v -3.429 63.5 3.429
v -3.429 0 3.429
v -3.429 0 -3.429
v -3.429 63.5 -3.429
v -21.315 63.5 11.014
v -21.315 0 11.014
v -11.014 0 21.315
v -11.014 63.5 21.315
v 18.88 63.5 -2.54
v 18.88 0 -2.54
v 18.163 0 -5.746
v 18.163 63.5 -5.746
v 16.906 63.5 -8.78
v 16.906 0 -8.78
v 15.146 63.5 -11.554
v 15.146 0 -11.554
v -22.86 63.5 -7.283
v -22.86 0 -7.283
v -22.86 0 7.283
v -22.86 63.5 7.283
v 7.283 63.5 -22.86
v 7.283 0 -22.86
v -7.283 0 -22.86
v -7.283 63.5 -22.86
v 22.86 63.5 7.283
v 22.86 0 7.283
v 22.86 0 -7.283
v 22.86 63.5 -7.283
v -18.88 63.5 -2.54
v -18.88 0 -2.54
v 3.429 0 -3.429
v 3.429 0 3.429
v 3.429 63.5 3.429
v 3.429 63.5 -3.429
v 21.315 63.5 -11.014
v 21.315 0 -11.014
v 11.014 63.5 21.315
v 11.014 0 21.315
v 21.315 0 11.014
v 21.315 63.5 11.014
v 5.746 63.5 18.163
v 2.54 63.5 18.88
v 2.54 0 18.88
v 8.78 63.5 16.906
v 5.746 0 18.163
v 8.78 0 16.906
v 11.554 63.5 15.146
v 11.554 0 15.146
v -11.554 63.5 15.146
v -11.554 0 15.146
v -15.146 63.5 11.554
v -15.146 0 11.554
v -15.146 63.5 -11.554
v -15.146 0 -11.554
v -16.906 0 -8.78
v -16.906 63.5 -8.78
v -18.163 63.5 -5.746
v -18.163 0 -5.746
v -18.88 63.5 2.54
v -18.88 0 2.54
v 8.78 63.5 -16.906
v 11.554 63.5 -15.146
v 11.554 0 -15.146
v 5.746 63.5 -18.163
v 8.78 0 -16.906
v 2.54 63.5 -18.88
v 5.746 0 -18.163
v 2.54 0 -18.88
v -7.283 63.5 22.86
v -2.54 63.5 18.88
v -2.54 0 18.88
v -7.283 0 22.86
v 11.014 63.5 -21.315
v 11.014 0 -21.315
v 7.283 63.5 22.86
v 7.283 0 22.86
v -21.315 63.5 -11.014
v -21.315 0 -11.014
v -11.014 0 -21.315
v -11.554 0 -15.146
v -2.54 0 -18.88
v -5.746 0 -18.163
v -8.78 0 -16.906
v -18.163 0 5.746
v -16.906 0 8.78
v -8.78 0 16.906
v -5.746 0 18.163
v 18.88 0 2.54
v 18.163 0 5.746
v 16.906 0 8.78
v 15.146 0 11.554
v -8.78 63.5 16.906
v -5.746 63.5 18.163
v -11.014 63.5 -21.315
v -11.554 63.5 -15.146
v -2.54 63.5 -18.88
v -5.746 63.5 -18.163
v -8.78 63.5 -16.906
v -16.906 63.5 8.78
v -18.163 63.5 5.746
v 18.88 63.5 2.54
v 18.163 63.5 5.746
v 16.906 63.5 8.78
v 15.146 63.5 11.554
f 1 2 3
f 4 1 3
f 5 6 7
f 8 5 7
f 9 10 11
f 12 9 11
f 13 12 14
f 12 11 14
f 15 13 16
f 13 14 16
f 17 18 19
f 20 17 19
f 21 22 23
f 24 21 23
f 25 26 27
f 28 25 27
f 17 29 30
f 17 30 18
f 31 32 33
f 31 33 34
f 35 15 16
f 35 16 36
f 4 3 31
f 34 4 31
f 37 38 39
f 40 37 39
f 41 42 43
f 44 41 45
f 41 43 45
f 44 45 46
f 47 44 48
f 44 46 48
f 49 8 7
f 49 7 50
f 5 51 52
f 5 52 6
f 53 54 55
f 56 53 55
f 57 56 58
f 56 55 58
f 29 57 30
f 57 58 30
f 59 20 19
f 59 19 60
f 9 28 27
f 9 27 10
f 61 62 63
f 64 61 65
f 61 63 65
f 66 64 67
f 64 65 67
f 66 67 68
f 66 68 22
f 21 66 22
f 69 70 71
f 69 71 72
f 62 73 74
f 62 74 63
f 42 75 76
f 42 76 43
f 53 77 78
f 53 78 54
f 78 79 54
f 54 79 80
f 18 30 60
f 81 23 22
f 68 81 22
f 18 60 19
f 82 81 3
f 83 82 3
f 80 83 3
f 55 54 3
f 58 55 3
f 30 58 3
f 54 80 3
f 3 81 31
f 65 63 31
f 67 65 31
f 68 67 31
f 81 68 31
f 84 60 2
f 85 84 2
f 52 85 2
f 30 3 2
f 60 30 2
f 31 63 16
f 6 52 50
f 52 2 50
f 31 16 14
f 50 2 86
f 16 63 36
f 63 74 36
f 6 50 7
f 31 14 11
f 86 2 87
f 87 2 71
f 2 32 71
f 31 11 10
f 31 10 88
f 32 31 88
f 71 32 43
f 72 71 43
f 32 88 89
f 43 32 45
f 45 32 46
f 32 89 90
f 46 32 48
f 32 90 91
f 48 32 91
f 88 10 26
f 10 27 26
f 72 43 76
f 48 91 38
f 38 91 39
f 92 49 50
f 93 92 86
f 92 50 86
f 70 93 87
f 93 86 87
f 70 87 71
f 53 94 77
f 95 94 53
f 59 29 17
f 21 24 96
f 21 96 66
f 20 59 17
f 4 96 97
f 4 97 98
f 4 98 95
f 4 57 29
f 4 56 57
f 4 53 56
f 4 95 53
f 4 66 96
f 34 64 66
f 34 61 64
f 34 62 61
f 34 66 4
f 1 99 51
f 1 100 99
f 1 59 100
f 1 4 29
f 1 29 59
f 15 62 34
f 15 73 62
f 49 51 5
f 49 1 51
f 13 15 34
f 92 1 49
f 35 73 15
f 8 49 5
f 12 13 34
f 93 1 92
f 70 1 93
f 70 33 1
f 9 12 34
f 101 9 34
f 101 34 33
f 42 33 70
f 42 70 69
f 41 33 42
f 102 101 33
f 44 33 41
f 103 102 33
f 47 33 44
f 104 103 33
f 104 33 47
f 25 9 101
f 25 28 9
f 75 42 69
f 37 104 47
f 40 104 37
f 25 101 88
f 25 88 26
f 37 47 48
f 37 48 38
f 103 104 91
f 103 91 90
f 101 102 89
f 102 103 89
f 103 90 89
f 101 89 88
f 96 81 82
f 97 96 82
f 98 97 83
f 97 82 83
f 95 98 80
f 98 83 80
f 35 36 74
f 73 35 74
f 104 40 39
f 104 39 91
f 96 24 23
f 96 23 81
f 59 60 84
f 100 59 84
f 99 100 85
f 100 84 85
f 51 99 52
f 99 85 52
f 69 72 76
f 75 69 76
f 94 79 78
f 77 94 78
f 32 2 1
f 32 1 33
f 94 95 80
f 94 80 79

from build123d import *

# Parameters (mm, degrees)
SKETCH2_R           = 19.05
SKETCH2_W           = 6.858
SKETCH2_H           = 6.858
BOSS_EXTRUDE1_DEPTH = 63.5
BOSS_EXTRUDE2_DEPTH = 63.5
CIRPATTERN1_COUNT   = 8


with BuildPart() as part:
    # Sketch2 → Boss-Extrude1 (new body)
    with BuildSketch(Plane(origin=(0, 0, 0), x_dir=(1, 0, 0), z_dir=(0, 1, 0))):
        with Locations(Location((0, 0, 0), (0, 0, 270))):
            Circle(SKETCH2_R)
        Rectangle(SKETCH2_W, SKETCH2_H, mode=Mode.SUBTRACT)
    extrude(amount=BOSS_EXTRUDE1_DEPTH)

    # Sketch3 → Boss-Extrude2 (add)
    with BuildSketch(Plane(origin=(0, 0, 0), x_dir=(1, 0, 0), z_dir=(0, 1, 0))):
        with BuildLine():
            Line((0, 22.86), (0, 19.05))
            ThreePointArc((0, 19.05), (1.272844406, 19.007429261), (2.54, 18.879907309))
            Line((2.54, 18.879907309), (7.283289763, 22.86))
            Line((7.283289763, 22.86), (0, 22.86))
        make_face()
        with BuildLine():
            ThreePointArc((-2.54, 18.879907309), (-1.272844406, 19.007429261), (0, 19.05))
            Line((0, 19.05), (0, 22.86))
            Line((0, 22.86), (-7.283289763, 22.86))
            Line((-7.283289763, 22.86), (-2.54, 18.879907309))
        make_face()
    boss_extrude2 = extrude(amount=BOSS_EXTRUDE2_DEPTH)

    # CirPattern1: Boss-Extrude2 ×8 about axis
    cirpattern1_axis = Axis((0, 0, 0), (0, 1, 0))
    for i in range(1, CIRPATTERN1_COUNT):
        add(boss_extrude2.rotate(cirpattern1_axis, i * 360 / CIRPATTERN1_COUNT))


solid = part.part
